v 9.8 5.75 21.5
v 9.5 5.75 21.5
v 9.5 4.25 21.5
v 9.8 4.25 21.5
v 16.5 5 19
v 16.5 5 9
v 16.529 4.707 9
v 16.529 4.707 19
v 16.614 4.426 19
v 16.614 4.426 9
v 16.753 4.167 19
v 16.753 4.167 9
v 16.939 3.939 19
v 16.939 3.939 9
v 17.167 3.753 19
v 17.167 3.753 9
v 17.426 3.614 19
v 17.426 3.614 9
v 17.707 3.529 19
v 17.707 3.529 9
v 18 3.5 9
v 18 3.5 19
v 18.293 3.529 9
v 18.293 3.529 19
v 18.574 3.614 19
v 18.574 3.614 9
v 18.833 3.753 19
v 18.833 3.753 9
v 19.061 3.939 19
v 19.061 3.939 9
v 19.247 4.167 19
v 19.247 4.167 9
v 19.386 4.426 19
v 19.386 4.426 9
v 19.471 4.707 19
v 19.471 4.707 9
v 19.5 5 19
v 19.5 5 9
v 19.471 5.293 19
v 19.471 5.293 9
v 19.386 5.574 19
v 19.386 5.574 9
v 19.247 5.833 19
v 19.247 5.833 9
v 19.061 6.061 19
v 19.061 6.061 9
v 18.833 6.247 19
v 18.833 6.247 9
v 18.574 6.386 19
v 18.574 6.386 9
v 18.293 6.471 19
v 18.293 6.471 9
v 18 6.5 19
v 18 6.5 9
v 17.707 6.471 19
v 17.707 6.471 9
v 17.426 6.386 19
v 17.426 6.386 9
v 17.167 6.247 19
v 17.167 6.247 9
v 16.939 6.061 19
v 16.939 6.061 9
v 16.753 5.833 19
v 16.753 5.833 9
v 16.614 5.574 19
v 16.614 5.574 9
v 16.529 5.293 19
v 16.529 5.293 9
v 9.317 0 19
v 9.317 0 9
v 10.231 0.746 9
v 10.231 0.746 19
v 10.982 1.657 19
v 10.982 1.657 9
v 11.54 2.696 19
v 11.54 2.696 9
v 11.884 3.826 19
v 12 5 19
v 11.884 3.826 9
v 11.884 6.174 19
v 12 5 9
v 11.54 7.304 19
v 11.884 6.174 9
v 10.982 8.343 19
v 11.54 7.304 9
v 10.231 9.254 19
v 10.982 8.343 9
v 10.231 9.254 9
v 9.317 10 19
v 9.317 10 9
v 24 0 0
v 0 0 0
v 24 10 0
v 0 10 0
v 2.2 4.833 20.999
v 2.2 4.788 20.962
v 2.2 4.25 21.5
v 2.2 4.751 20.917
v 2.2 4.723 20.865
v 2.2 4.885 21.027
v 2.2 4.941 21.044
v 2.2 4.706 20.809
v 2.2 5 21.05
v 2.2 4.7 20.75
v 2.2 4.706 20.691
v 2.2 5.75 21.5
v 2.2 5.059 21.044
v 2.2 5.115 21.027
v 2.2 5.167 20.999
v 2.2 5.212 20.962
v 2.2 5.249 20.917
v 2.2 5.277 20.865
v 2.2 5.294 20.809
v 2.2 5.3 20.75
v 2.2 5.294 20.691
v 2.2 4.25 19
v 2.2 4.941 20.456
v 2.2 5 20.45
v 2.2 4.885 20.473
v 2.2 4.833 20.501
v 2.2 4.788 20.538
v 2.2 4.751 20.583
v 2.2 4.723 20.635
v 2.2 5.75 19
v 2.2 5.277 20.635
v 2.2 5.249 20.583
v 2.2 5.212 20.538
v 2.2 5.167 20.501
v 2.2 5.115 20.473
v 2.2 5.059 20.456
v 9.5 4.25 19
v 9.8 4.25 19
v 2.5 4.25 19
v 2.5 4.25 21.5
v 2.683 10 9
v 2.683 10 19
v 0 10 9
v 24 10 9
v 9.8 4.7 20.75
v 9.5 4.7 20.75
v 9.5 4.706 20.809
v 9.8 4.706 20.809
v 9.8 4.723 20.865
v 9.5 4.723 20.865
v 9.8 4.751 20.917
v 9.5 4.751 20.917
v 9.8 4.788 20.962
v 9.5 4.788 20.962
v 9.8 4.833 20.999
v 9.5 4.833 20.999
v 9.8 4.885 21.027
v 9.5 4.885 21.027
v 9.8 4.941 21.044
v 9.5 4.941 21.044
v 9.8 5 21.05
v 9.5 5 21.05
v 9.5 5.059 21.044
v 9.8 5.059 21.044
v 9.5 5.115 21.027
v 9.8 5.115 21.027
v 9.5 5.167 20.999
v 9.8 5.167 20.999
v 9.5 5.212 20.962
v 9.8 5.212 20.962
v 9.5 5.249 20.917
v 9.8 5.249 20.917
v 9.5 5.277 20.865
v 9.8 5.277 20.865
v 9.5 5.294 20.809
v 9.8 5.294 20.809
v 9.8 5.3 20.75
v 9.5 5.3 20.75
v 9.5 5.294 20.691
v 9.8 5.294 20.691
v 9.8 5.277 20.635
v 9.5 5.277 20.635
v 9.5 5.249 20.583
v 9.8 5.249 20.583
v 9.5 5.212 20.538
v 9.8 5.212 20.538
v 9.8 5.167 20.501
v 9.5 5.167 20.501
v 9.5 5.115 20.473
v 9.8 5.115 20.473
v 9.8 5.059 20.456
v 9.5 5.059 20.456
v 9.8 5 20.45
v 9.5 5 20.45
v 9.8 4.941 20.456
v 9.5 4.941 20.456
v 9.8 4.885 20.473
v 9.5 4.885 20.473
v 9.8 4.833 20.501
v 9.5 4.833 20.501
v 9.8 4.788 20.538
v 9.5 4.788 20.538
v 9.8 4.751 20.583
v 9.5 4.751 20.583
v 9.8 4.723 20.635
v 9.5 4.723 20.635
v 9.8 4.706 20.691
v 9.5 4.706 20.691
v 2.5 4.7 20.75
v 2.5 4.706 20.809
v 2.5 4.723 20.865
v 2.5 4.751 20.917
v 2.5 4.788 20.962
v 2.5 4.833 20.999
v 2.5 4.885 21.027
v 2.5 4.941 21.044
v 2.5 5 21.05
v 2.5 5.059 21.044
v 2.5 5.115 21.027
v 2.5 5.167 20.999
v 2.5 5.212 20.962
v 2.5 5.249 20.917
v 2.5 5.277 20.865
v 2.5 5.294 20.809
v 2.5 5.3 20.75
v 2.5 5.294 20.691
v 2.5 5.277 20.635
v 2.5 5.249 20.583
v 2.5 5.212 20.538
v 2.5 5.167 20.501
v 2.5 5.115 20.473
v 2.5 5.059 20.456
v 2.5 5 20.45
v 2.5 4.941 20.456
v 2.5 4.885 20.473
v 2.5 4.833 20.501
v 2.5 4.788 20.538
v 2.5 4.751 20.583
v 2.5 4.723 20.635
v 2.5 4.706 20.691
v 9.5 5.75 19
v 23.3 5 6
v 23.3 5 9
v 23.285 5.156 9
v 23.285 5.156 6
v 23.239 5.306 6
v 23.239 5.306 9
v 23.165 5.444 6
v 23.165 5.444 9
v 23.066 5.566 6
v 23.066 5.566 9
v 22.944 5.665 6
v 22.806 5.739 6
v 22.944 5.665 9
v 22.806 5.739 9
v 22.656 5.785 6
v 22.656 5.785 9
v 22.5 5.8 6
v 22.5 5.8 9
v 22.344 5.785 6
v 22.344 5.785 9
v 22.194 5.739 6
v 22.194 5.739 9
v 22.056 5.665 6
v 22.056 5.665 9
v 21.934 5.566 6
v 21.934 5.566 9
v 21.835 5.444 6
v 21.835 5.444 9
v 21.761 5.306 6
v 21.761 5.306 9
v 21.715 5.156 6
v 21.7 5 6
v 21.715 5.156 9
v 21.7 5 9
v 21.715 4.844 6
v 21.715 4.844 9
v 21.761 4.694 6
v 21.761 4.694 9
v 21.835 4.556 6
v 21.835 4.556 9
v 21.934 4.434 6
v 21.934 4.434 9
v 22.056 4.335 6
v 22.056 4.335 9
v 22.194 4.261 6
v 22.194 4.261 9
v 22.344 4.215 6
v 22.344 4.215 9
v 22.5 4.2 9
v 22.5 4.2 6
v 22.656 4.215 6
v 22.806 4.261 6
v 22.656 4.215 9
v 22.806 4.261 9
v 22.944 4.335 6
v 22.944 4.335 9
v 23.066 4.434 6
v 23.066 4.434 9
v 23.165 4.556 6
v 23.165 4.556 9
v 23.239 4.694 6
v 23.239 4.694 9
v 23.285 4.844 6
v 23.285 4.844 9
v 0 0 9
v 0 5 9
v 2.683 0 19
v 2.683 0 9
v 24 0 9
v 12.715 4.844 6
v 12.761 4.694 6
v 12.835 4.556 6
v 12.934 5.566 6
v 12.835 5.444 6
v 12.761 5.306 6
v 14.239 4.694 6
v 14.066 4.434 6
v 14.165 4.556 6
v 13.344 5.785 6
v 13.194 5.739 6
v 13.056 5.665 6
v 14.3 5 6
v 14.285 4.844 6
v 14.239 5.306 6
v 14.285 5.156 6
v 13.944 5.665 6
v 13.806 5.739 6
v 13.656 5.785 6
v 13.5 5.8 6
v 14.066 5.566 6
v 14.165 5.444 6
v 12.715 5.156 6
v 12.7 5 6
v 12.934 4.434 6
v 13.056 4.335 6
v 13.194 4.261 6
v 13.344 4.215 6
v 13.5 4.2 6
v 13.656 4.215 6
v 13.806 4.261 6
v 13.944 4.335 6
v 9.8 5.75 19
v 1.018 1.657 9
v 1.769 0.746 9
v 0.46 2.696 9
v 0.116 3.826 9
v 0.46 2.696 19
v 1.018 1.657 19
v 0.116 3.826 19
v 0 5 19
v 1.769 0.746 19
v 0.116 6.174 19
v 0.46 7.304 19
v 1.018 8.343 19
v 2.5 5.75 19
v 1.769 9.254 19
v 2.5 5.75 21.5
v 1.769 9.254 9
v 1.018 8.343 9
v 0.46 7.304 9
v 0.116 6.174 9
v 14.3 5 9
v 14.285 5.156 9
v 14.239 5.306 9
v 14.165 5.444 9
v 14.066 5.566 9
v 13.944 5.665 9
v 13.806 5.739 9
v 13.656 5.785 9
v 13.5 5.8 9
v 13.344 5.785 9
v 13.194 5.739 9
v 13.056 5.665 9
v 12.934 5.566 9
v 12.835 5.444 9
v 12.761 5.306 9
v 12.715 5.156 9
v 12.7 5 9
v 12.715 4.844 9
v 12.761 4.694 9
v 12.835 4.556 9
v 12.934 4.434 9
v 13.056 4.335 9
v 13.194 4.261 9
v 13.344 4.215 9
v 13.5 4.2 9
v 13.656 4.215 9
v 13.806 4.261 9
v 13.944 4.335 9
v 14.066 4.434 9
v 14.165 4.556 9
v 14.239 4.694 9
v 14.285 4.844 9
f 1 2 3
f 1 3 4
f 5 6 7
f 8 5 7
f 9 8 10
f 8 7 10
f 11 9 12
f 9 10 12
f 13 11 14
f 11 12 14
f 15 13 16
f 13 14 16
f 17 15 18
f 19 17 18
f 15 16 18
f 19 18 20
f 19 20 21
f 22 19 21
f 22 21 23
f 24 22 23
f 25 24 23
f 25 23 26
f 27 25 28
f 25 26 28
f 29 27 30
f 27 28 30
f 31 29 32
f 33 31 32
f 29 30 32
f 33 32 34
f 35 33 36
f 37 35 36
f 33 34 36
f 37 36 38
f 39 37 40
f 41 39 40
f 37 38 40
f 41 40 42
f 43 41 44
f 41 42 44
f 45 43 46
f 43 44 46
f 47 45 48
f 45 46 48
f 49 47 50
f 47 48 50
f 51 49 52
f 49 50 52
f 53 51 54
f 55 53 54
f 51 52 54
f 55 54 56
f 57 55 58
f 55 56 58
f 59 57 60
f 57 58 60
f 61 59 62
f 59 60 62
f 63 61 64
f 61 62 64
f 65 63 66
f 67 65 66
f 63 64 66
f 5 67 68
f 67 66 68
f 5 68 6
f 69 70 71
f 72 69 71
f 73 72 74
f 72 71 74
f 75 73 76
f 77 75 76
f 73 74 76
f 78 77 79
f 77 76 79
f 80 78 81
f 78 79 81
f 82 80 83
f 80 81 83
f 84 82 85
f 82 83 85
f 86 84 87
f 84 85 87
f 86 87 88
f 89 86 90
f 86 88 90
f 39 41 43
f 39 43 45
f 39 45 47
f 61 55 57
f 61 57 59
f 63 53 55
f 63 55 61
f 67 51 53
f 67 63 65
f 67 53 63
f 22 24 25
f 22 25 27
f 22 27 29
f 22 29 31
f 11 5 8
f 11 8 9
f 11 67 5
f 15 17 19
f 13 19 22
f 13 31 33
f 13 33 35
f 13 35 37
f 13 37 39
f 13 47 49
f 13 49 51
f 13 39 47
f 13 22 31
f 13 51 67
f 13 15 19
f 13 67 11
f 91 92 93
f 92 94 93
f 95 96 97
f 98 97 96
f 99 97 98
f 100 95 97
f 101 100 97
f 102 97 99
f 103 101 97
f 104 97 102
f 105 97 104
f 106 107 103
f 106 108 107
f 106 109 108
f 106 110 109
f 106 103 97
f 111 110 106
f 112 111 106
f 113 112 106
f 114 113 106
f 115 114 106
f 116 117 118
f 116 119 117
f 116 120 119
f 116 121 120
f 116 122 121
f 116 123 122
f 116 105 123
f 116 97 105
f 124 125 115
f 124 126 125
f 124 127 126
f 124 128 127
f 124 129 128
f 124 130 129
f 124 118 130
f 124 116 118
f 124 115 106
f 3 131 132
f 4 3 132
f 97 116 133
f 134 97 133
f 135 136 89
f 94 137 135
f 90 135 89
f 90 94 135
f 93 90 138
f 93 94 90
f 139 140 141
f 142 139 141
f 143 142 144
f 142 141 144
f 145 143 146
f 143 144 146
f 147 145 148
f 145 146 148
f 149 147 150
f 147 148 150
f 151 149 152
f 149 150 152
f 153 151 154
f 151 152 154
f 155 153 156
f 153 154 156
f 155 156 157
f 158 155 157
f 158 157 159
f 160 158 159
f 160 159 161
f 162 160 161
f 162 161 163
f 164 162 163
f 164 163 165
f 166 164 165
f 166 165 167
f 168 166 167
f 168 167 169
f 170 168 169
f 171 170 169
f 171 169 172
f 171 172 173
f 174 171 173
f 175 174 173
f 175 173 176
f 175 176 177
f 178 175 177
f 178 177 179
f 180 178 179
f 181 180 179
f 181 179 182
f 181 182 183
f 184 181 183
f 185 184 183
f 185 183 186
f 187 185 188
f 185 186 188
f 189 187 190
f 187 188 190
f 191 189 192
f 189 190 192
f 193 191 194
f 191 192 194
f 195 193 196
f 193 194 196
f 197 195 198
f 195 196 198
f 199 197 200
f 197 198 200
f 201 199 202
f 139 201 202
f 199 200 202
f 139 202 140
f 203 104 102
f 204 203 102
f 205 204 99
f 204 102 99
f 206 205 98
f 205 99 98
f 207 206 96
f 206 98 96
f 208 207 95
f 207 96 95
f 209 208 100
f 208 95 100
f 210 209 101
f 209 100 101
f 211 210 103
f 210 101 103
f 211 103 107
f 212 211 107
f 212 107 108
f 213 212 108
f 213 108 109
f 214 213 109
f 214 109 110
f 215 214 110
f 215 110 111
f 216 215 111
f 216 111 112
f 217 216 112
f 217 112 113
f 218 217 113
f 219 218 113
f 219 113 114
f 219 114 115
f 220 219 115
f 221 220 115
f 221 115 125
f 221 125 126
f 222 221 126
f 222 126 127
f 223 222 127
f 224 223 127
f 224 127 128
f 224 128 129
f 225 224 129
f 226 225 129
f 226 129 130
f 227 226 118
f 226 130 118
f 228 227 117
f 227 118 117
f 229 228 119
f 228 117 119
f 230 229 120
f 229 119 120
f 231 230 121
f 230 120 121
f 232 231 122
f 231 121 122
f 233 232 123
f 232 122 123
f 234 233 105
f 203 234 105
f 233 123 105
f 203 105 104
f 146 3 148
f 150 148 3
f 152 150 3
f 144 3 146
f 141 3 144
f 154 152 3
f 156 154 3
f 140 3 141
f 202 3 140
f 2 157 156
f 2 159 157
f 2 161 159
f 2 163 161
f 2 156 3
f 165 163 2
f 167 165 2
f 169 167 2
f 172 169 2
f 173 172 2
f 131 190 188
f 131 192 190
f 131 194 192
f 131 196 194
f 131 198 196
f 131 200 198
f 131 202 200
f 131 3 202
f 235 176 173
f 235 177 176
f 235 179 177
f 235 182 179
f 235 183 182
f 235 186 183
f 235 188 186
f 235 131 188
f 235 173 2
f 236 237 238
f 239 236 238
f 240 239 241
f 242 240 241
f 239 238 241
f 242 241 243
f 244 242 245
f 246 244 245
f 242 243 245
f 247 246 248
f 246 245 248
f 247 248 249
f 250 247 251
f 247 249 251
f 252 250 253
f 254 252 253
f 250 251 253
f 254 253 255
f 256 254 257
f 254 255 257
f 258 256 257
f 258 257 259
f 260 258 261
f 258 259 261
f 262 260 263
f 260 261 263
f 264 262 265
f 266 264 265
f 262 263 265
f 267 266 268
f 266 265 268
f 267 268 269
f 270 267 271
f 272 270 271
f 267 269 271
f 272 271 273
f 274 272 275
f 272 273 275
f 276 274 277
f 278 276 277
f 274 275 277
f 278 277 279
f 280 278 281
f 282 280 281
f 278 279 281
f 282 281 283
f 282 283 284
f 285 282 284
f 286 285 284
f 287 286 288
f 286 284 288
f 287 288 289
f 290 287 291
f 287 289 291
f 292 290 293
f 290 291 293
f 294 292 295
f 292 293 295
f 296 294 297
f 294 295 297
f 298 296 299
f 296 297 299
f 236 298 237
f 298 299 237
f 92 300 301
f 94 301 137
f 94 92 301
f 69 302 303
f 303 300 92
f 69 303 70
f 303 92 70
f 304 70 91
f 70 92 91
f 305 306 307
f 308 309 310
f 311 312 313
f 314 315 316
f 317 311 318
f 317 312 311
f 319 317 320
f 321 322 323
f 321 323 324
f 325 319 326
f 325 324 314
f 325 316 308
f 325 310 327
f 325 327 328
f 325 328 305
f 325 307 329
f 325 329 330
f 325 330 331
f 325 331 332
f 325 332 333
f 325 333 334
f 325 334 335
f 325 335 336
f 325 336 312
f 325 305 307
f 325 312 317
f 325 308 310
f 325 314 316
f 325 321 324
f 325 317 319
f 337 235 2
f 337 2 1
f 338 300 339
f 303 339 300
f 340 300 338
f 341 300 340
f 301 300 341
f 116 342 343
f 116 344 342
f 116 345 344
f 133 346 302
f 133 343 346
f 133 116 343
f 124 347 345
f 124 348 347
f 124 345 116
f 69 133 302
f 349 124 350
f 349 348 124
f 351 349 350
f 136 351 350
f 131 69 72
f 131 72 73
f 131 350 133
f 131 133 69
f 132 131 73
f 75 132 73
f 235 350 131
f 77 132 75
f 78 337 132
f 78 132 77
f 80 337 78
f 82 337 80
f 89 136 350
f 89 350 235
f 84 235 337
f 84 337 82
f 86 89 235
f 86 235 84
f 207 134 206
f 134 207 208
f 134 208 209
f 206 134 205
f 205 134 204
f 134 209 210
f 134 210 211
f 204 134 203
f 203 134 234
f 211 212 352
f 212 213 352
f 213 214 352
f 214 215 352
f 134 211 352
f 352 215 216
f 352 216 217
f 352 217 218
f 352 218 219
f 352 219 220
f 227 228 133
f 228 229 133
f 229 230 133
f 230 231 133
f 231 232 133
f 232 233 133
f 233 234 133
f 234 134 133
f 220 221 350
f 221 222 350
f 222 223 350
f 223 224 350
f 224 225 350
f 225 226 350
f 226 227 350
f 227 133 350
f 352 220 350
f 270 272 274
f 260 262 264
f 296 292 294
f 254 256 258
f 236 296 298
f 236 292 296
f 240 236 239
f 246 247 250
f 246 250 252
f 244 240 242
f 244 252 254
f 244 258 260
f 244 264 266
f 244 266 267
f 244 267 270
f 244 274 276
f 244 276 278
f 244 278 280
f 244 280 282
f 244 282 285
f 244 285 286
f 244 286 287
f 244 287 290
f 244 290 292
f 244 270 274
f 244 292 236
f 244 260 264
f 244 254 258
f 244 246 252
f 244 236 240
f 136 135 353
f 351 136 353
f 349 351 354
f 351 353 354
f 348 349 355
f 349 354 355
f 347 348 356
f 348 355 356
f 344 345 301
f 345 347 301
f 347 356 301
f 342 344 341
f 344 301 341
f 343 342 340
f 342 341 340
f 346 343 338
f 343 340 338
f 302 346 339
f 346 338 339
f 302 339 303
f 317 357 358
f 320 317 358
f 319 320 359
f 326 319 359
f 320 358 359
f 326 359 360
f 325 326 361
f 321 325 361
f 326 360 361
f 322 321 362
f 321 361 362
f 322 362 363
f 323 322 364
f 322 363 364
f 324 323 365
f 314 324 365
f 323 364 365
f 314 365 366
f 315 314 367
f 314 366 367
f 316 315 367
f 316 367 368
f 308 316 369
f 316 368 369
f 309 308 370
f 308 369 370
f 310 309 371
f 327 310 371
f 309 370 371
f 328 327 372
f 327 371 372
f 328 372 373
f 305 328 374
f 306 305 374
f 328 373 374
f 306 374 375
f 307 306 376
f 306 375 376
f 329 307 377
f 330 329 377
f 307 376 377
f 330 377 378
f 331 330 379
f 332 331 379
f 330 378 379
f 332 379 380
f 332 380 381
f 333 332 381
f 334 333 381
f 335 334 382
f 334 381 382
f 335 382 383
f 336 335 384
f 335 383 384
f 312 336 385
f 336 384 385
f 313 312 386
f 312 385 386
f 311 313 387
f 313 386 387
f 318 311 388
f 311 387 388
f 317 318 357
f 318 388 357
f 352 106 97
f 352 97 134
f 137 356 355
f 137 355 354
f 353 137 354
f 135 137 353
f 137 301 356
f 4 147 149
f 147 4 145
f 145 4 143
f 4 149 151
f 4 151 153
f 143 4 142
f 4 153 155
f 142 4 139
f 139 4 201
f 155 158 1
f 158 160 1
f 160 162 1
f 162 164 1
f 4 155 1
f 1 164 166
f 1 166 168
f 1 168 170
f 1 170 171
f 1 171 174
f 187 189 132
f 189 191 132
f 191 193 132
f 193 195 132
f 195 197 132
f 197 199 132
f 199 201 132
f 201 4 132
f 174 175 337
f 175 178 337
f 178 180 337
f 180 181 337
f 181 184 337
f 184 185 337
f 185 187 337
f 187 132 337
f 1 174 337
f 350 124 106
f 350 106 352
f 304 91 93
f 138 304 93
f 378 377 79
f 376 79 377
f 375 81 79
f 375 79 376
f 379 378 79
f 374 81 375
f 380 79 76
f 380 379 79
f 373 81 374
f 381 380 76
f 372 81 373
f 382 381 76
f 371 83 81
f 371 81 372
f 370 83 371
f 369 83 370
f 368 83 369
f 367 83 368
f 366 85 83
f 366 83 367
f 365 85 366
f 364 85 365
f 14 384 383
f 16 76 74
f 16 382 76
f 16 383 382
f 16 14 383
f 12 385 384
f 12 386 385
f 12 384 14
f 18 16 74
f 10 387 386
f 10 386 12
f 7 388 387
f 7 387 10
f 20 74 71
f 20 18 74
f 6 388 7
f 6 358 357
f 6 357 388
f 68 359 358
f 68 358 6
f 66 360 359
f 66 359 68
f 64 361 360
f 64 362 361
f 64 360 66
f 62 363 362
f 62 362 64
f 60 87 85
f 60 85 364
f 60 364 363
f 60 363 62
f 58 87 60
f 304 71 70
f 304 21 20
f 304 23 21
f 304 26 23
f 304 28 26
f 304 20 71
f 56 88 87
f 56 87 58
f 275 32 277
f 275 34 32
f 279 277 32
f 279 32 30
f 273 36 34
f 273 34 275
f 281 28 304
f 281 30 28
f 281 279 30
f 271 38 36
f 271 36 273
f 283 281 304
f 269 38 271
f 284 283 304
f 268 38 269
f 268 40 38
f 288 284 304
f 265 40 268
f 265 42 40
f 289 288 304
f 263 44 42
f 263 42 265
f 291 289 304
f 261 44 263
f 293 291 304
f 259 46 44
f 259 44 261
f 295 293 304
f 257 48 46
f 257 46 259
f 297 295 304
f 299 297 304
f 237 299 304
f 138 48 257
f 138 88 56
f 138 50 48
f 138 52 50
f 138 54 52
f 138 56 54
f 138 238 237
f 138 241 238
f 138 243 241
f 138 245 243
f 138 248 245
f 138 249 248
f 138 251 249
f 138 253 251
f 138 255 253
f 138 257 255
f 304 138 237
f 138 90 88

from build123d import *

# Parameters (mm, degrees)
SKETCH_1_W          = 12
SKETCH_1_H          = 10
EXTRUDE_1_DEPTH     = 19
SKETCH_2_OUTSIDE_W  = 18.92
SKETCH_2_OUTSIDE_H  = 16.92
SKETCH_2_OUTSIDE_R  = 6
CUT_EXTRUDE_1_DEPTH = 19
SKETCH_3_W          = 24
SKETCH_3_H          = 10
EXTRUDE_2_DEPTH     = 9
SKETCH_4_R          = 1.5
EXTRUDE_3_DEPTH     = 10
SKETCH_9_R          = 0.8
CUT_EXTRUDE_2_DEPTH = 3
SKETCH_10_W         = 0.3
SKETCH_10_H         = 1.5
EXTRUDE_5_DEPTH     = 2.5
SKETCH_12_R         = 0.3
CUT_EXTRUDE_3_DEPTH = 7.6


with BuildPart() as part:
    # 草图1 → 凸台-拉伸1 (new body)
    with BuildSketch(Plane.XY):
        with Locations((6, 5)):
            Rectangle(SKETCH_1_W, SKETCH_1_H)
    extrude(amount=EXTRUDE_1_DEPTH)

    # 草图2 outside → 切除-拉伸1 (cut)
    with BuildSketch(Plane.XY):
        with Locations((6, 5)):
            Rectangle(SKETCH_2_OUTSIDE_W, SKETCH_2_OUTSIDE_H)
        with Locations((6, 5)):
            Circle(SKETCH_2_OUTSIDE_R, mode=Mode.SUBTRACT)
    extrude(amount=CUT_EXTRUDE_1_DEPTH, mode=Mode.SUBTRACT)

    # 草图3 → 凸台-拉伸2 (add)
    with BuildSketch(Plane.XY):
        with Locations((12, 5)):
            Rectangle(SKETCH_3_W, SKETCH_3_H)
    extrude(amount=EXTRUDE_2_DEPTH)

    # 草图4 → 凸台-拉伸3 (add)
    with BuildSketch(Plane.XY.offset(9)):
        with Locations(Location((18, 5, 0), (0, 0, 180))):
            Circle(SKETCH_4_R)
    extrude(amount=EXTRUDE_3_DEPTH)

    # 草图9 → 切除-拉伸2 (cut)
    with BuildSketch(Plane.XY.offset(9)):
        with Locations((13.5, 5)):
            Circle(SKETCH_9_R)
        with Locations((22.5, 5)):
            Circle(SKETCH_9_R)
    extrude(amount=-CUT_EXTRUDE_2_DEPTH, mode=Mode.SUBTRACT)

    # 草图10 → 凸台-拉伸5 (add)
    with BuildSketch(Plane.XY.offset(19)):
        with Locations((2.35, 5)):
            Rectangle(SKETCH_10_W, SKETCH_10_H)
        with Locations((9.65, 5)):
            Rectangle(SKETCH_10_W, SKETCH_10_H)
    extrude(amount=EXTRUDE_5_DEPTH)

    # 草图12 → 切除-拉伸3 (cut)
    with BuildSketch(Plane.ZY.offset(-2.2)):
        with Locations(Location((20.75, 5, 0), (0, 0, 270))):
            Circle(SKETCH_12_R)
    extrude(amount=-CUT_EXTRUDE_3_DEPTH, mode=Mode.SUBTRACT)


solid = part.part
